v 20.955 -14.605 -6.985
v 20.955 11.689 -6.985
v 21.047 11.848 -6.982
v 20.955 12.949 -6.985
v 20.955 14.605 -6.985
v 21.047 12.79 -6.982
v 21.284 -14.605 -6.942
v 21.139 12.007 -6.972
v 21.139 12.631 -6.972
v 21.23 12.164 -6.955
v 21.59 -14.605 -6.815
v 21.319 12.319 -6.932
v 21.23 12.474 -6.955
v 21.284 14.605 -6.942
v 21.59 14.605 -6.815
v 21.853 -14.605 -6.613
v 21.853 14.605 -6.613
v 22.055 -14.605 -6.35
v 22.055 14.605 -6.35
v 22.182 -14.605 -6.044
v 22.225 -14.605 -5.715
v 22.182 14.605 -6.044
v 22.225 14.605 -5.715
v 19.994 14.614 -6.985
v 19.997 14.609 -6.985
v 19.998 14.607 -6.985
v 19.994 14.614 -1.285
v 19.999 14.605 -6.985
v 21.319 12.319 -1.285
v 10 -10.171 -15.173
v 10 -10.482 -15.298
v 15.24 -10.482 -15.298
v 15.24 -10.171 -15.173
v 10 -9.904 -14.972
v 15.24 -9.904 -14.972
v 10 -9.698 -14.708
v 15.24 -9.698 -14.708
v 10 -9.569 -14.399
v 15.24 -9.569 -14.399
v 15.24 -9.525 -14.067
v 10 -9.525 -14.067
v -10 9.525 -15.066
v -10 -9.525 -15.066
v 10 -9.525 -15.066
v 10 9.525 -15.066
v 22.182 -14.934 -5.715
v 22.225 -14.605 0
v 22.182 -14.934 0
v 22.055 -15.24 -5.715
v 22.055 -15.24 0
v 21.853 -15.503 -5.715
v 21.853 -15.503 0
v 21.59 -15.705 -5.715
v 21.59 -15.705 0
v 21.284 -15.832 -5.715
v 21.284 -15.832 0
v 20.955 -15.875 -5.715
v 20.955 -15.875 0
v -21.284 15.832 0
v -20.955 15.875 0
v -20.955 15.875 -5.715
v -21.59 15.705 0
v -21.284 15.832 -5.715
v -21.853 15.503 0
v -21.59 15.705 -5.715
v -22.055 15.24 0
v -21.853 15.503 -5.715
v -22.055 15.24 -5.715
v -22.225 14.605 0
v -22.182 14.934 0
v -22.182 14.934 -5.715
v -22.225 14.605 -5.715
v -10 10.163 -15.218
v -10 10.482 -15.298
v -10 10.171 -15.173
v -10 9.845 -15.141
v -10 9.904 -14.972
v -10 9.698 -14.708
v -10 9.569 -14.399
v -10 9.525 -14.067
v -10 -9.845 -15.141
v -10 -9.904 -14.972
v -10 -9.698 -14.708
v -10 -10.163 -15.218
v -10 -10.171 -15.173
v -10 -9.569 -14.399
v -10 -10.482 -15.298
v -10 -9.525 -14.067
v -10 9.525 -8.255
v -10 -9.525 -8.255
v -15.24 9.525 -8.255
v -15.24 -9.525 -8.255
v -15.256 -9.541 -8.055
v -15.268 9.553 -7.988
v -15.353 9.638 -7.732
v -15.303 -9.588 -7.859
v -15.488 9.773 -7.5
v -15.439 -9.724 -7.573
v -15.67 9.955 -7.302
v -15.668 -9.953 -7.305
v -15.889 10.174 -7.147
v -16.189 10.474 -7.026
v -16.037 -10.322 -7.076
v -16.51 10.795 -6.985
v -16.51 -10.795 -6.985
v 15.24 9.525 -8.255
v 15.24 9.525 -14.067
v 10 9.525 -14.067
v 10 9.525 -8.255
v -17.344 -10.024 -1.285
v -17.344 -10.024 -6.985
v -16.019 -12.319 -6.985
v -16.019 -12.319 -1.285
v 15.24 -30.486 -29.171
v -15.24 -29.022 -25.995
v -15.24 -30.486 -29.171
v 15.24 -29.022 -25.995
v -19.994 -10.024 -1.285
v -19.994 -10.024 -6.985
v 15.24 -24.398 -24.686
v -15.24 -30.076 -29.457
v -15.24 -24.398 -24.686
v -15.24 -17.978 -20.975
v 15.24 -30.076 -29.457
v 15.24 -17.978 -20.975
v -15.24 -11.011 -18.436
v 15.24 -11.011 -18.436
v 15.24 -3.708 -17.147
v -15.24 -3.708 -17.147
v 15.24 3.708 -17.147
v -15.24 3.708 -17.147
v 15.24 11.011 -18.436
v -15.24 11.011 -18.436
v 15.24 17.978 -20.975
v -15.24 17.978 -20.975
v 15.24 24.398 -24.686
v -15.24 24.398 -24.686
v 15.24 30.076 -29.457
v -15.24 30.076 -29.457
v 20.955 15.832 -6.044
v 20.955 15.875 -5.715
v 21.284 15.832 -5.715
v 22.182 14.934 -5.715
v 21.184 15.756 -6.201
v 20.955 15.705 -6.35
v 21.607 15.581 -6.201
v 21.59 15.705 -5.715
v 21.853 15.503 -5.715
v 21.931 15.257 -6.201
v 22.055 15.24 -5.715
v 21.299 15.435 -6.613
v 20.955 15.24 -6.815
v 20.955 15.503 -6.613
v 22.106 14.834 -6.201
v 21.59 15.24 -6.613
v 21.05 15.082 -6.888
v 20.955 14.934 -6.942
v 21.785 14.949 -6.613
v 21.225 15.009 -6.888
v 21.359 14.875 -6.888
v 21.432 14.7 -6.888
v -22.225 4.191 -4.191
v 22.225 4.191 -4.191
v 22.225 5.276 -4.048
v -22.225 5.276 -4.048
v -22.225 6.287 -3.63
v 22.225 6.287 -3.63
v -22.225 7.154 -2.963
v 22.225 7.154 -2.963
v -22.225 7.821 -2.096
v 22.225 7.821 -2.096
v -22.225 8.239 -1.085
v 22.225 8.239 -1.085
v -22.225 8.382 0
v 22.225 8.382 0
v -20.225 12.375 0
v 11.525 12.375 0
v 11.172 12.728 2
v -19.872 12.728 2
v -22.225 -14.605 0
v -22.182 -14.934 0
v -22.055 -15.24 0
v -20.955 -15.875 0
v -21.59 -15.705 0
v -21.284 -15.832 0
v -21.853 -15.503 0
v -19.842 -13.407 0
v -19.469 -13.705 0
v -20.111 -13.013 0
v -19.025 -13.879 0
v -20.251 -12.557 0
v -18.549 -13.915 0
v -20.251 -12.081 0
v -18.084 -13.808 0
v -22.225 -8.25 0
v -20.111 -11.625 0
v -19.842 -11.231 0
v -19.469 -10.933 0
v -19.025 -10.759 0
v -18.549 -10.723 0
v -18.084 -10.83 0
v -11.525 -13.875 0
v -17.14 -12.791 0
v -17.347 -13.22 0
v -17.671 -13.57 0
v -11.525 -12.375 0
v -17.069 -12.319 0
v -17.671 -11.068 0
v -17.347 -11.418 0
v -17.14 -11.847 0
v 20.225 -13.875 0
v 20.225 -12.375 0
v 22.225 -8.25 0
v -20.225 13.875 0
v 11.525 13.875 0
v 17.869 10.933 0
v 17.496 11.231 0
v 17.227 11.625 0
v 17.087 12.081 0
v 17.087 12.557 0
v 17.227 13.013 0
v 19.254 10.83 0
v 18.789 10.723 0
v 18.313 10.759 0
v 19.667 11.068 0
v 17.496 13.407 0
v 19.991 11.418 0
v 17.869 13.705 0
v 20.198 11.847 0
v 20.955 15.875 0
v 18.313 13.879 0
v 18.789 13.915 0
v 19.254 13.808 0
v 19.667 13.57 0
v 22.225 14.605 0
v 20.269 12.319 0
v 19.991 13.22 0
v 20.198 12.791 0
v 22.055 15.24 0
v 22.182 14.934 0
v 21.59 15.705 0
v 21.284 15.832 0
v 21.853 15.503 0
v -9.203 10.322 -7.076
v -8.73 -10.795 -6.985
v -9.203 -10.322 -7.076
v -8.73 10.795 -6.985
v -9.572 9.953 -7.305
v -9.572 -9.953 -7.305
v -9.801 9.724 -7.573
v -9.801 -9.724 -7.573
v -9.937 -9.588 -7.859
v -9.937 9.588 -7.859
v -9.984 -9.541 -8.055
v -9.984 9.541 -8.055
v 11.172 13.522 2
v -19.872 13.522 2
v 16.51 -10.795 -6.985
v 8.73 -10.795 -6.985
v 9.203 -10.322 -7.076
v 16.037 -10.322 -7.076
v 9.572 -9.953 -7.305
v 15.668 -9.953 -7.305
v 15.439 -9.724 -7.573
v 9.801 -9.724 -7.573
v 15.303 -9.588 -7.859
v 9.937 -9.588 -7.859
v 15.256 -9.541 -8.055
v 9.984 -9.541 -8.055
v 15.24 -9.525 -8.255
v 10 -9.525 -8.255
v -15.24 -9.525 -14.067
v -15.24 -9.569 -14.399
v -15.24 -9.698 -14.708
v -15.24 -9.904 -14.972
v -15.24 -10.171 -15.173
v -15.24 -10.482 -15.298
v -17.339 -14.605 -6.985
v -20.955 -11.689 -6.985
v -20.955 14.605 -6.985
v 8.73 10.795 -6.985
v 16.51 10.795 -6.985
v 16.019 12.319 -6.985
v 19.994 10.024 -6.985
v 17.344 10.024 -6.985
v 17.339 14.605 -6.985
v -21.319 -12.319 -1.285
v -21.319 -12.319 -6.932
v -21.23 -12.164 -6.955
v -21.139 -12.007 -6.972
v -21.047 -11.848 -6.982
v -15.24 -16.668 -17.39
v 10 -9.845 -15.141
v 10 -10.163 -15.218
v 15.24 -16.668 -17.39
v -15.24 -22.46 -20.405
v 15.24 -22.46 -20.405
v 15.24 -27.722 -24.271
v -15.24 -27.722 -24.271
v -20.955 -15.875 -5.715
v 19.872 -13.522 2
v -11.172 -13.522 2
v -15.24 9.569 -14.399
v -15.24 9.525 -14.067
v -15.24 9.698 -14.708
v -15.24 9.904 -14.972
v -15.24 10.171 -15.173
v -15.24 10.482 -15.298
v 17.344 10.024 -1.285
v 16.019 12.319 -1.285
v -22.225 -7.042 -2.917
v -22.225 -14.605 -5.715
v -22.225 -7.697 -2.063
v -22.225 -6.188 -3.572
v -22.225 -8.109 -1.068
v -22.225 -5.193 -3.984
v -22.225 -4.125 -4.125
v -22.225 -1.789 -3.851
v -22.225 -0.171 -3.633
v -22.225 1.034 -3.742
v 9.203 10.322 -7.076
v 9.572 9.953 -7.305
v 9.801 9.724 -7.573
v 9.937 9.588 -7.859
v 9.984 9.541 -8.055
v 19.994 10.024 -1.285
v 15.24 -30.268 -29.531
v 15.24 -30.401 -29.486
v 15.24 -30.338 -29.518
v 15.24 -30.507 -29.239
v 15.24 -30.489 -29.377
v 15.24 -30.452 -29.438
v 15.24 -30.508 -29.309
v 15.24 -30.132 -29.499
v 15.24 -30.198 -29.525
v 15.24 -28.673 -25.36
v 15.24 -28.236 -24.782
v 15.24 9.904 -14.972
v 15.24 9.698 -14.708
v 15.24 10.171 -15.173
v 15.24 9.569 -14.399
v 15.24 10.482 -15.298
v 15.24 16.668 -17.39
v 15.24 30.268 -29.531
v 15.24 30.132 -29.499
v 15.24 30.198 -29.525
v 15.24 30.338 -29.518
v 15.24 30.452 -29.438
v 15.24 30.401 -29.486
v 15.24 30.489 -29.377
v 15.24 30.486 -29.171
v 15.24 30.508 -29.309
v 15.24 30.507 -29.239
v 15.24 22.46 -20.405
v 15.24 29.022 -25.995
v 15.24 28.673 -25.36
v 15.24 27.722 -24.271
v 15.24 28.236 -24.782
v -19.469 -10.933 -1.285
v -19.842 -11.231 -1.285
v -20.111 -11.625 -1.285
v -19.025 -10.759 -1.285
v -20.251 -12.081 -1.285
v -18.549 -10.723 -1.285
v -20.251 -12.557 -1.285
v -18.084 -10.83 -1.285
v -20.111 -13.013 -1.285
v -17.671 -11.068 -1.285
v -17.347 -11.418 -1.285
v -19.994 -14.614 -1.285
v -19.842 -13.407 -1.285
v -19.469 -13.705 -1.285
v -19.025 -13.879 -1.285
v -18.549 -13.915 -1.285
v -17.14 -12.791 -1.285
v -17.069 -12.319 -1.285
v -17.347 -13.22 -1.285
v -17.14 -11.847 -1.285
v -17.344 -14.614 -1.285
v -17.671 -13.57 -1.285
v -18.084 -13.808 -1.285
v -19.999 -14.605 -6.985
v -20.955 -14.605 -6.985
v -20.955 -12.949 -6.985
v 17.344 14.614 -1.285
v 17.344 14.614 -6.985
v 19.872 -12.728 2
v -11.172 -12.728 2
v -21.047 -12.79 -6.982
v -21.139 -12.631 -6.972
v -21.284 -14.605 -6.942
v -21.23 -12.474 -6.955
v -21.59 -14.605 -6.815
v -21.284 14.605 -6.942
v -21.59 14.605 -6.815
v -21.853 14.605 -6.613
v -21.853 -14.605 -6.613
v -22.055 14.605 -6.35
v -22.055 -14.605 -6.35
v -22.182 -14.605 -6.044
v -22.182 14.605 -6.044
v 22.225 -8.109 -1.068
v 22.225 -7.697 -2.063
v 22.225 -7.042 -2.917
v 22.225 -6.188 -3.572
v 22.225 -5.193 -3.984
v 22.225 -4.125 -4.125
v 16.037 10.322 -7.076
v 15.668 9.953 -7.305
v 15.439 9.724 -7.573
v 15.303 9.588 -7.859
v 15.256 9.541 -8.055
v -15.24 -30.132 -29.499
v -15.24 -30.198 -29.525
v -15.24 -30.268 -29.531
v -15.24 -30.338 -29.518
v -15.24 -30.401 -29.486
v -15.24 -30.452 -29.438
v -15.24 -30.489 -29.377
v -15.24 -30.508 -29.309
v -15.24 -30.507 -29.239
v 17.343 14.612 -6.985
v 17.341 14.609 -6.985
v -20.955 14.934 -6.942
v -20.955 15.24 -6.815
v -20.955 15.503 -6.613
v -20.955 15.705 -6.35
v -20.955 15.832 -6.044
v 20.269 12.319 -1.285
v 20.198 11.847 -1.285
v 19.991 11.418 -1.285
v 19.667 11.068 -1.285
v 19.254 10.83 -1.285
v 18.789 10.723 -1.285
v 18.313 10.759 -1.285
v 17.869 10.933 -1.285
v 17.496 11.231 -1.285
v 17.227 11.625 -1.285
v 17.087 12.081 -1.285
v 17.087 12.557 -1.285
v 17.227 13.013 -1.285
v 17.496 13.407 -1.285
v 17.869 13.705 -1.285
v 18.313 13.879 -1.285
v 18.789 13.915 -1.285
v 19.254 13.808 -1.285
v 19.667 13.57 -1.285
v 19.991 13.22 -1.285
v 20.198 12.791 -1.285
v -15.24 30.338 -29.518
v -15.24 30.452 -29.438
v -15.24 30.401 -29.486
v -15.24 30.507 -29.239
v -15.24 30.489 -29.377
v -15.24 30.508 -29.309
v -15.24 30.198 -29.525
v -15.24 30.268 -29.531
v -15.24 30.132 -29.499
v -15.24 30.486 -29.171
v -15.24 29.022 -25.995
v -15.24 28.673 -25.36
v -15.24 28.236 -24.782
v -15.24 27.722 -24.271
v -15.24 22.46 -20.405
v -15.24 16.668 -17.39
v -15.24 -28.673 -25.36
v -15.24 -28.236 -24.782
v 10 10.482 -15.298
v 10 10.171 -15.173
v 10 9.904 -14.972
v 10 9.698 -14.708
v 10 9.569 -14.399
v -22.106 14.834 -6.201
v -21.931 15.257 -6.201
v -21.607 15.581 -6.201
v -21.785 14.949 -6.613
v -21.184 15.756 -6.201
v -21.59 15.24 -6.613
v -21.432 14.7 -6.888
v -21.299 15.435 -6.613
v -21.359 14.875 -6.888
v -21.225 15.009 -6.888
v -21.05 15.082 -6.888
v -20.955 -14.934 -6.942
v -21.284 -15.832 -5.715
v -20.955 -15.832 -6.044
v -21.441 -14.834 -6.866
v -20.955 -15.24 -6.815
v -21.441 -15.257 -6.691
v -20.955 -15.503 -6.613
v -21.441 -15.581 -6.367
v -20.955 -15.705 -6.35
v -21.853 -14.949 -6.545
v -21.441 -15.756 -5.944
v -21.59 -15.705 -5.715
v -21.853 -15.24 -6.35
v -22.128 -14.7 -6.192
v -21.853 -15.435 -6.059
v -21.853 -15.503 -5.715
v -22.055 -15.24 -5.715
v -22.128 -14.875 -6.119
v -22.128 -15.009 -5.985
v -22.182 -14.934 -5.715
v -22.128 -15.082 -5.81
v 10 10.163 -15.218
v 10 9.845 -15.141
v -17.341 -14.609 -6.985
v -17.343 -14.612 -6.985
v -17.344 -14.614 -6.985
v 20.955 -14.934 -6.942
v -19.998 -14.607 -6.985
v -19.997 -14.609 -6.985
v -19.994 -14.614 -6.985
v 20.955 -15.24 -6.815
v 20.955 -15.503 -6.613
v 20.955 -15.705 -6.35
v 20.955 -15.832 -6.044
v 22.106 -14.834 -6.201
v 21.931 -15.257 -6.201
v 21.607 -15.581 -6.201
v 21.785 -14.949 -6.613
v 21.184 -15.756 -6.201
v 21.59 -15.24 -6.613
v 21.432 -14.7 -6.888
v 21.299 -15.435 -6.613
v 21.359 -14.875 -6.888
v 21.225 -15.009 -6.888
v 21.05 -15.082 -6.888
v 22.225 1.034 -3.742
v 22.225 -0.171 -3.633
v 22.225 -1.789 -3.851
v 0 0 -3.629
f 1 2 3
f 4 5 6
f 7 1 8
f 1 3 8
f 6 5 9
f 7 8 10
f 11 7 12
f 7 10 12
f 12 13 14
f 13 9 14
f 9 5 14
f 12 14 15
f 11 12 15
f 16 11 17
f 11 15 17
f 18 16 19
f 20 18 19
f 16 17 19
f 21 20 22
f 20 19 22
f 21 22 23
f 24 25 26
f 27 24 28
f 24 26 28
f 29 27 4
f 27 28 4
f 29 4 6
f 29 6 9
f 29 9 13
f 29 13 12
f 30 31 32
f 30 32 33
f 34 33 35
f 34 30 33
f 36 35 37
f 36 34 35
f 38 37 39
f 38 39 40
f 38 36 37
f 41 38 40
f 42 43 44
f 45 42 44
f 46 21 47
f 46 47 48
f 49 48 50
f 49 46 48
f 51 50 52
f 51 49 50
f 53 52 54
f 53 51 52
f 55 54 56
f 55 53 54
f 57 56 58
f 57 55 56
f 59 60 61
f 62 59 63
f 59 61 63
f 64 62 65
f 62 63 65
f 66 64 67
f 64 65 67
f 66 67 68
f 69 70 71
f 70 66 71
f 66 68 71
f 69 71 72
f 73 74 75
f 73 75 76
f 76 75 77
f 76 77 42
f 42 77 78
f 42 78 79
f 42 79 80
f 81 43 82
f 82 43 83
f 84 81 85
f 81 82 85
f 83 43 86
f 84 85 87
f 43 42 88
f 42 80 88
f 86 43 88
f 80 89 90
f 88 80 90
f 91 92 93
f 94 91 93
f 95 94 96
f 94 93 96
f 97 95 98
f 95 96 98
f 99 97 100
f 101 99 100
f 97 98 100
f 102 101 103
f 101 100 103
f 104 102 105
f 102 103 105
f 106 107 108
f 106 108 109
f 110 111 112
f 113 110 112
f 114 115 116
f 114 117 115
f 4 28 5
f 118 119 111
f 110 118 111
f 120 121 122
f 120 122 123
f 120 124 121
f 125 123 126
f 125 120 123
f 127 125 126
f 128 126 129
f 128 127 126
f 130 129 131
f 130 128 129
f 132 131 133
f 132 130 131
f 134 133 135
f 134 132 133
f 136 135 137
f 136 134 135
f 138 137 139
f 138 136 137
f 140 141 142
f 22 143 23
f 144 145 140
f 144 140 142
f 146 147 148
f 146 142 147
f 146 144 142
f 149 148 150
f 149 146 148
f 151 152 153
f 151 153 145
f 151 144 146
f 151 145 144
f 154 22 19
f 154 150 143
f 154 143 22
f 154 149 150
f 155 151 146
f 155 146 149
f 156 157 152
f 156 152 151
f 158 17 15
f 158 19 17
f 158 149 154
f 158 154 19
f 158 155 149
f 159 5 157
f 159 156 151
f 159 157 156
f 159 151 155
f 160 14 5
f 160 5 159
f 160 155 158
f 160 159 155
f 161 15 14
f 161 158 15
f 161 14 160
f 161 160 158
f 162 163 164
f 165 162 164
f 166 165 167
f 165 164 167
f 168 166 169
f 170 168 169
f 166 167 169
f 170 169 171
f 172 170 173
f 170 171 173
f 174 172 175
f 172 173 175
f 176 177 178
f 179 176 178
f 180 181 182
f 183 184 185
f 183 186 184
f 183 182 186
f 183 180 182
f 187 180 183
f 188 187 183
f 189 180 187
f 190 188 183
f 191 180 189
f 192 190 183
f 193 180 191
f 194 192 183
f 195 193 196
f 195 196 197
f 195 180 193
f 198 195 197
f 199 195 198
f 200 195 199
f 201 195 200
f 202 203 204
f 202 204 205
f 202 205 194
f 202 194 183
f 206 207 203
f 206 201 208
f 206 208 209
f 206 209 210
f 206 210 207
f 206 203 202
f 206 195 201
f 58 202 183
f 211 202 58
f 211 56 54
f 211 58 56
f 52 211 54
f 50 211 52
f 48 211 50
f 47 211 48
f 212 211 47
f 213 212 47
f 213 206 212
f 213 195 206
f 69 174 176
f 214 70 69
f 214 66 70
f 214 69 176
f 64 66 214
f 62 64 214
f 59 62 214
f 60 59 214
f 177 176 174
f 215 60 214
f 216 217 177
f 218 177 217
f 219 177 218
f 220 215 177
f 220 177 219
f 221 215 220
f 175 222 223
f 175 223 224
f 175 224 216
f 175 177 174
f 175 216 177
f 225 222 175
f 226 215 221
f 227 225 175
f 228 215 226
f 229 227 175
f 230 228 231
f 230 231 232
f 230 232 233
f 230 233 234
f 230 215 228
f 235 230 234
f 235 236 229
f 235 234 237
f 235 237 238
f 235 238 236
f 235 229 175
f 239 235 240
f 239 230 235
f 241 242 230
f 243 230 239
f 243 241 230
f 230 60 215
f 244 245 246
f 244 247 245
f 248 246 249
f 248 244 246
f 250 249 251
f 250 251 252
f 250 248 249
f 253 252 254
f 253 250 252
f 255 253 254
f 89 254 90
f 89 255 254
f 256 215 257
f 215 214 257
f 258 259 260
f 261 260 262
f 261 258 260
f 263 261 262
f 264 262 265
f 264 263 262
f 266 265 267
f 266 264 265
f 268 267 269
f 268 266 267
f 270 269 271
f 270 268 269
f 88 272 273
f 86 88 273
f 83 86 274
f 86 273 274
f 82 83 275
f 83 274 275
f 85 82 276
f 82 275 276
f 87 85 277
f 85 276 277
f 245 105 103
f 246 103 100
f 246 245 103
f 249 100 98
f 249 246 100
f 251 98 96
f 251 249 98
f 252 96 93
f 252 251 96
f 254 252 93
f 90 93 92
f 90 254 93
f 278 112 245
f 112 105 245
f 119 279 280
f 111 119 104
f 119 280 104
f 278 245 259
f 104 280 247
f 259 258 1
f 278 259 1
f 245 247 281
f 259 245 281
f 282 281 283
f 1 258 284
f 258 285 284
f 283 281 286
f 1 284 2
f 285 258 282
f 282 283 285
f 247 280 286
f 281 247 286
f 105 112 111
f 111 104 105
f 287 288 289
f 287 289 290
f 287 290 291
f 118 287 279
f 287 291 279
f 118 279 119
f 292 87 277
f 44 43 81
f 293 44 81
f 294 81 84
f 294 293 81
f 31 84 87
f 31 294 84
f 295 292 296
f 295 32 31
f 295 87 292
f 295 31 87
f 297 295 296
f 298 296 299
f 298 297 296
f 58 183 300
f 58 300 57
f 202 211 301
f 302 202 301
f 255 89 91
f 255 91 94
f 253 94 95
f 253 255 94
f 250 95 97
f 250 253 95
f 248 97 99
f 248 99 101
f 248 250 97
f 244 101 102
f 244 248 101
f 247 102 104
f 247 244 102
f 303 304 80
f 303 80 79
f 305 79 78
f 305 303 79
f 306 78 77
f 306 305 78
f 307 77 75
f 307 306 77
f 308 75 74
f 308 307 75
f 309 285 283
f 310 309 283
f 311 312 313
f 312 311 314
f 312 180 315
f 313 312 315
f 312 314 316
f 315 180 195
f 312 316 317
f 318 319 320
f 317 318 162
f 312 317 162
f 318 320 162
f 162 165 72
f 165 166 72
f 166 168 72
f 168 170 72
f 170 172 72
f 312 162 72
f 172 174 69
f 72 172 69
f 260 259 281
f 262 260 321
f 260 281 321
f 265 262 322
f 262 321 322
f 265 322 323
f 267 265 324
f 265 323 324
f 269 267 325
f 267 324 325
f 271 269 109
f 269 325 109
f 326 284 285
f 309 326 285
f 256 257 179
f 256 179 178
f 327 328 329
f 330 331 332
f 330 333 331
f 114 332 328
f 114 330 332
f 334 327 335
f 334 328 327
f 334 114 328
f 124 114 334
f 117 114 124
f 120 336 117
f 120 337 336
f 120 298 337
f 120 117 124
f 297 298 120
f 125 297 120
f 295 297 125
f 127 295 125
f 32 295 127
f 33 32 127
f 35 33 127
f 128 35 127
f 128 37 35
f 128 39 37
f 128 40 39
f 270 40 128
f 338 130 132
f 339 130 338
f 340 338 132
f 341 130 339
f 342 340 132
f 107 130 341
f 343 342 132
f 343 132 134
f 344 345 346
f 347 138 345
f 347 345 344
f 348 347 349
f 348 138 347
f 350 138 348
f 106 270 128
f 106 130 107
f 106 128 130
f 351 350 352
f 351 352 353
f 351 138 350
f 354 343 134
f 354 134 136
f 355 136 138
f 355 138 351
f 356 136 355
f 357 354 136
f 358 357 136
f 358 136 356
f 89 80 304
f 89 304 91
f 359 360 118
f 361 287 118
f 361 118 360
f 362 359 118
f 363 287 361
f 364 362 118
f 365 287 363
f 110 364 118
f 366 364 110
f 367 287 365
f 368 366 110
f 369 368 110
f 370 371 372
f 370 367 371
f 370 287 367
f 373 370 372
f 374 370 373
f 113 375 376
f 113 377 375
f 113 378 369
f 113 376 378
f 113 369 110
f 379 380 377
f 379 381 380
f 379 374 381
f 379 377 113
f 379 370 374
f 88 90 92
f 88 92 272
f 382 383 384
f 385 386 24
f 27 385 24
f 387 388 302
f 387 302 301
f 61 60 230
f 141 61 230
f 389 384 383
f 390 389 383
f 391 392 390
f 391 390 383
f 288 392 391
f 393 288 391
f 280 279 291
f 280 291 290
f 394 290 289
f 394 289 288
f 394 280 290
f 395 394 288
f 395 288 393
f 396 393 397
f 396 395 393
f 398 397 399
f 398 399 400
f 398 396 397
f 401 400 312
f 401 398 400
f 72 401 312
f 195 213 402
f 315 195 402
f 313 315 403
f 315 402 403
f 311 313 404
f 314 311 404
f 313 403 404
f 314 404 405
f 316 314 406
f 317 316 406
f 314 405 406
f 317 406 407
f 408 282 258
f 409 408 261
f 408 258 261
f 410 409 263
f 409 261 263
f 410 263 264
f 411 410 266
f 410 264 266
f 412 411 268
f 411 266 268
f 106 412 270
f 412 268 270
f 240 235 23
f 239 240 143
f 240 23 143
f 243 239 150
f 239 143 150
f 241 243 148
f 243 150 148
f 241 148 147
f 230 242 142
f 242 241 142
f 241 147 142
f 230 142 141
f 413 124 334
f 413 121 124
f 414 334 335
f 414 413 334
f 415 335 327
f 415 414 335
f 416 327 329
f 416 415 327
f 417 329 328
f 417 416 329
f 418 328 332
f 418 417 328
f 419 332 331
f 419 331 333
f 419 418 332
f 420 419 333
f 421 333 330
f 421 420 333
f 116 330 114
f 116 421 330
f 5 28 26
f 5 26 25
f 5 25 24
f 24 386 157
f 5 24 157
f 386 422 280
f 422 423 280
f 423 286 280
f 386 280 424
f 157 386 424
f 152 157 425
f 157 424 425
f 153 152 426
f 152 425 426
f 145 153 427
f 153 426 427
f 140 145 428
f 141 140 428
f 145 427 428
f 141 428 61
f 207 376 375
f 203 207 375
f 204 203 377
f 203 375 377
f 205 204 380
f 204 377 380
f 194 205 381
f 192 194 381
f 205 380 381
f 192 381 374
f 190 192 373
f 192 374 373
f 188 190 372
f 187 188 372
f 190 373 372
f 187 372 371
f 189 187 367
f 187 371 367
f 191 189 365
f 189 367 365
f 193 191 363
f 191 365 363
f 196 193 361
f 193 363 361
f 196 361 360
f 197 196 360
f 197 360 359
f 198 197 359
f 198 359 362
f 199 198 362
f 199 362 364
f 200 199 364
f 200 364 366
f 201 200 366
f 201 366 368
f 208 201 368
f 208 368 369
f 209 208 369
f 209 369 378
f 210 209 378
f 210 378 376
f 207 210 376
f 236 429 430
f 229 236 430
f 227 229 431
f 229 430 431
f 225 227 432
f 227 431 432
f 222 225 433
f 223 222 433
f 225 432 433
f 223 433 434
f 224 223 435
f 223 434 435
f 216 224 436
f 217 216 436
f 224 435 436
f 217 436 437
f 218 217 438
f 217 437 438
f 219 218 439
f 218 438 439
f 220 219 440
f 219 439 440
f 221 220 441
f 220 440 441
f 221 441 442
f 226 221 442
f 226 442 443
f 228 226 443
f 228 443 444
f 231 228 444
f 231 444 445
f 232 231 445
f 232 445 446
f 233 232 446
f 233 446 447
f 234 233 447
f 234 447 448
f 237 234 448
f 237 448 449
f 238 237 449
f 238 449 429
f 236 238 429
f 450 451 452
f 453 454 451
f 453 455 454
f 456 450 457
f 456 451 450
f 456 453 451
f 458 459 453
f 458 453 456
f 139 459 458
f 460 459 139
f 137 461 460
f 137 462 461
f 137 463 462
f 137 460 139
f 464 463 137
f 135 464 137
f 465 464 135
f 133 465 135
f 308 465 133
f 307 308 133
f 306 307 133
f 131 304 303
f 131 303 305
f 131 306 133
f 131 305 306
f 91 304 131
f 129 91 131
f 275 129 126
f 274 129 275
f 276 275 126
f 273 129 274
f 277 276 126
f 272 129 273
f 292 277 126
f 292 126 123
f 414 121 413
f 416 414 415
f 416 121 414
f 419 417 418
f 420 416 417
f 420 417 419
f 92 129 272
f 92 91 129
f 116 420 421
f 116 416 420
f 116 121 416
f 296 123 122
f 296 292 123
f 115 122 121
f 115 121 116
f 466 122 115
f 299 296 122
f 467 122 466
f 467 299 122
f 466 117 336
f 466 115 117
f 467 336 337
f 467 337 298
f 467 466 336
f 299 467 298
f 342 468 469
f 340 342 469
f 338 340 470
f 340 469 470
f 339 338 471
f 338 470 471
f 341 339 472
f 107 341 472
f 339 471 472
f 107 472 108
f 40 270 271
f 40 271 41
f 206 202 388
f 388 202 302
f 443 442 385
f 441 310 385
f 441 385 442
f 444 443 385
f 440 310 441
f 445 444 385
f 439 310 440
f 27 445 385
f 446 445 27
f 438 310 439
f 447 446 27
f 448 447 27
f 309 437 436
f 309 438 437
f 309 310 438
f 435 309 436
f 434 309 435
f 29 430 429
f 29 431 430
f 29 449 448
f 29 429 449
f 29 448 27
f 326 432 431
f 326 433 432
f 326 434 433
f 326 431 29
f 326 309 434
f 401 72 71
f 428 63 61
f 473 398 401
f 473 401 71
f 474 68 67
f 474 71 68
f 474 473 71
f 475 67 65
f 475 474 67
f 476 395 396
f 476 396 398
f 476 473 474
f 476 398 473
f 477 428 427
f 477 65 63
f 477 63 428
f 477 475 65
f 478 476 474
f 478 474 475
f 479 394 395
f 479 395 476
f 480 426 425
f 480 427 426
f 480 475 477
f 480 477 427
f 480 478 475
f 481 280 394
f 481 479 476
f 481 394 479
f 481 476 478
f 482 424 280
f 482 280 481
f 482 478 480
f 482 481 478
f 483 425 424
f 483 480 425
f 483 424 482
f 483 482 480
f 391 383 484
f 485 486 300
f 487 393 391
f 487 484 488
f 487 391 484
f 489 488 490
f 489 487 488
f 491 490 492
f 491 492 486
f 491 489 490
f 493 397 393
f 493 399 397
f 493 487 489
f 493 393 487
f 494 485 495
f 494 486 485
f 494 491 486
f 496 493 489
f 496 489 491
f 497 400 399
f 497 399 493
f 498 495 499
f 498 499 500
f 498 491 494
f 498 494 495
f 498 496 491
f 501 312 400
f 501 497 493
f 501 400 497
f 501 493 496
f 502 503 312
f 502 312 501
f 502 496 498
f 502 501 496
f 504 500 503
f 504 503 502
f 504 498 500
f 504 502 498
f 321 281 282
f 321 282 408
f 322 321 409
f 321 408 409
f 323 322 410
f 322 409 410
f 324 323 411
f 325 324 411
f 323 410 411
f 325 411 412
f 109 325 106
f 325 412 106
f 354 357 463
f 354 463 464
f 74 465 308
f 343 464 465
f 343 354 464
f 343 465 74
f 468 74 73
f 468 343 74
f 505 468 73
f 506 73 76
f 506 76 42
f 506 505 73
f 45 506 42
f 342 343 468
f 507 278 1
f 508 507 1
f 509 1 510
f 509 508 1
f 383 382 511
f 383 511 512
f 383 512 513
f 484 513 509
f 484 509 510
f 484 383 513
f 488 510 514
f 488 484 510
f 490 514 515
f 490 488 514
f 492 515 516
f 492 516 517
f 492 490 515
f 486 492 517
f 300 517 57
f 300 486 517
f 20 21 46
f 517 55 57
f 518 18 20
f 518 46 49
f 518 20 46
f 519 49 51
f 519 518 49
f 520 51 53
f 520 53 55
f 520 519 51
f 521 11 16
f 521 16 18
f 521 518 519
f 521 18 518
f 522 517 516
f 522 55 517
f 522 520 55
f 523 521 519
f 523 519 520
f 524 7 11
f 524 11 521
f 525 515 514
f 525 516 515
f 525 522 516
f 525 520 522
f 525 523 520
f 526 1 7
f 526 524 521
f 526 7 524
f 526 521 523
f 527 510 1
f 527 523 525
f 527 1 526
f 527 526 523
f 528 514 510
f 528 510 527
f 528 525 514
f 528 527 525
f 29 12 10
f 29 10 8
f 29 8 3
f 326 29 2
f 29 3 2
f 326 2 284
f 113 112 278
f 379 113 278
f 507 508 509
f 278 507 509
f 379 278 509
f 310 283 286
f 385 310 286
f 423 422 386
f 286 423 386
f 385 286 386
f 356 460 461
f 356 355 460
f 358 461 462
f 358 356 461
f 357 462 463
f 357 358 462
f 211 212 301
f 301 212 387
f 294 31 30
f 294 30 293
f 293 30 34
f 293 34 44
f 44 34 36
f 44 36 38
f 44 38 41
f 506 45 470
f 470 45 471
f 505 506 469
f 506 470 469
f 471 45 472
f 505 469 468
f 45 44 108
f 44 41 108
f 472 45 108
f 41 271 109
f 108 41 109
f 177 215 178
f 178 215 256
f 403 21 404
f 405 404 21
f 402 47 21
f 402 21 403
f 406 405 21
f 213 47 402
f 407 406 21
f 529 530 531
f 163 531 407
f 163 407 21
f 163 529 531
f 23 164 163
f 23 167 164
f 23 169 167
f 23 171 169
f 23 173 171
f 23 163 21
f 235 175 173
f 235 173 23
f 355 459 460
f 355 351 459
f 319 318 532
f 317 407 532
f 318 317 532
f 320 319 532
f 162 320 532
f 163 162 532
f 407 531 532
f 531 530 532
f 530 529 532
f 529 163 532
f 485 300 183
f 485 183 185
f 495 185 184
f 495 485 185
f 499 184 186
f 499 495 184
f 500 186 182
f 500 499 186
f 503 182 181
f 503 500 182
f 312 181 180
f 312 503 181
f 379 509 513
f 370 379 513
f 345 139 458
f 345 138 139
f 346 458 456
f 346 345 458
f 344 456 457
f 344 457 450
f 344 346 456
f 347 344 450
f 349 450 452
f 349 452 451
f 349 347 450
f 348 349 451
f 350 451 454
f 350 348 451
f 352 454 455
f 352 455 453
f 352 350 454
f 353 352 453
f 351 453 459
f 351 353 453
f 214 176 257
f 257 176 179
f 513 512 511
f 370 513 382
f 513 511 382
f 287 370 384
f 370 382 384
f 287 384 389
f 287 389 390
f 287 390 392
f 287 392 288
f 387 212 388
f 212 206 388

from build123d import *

# Parameters (mm, degrees)
F1_W          = 44.45
F1_H          = 31.75
F2_DEPTH      = 6.985
F4_DEPTH      = 44.45
F6_DEPTH      = 15.24
F6_DEPTH_BACK = 15.24
F7_W          = 20
F7_H          = 8.0811108913
F8_DEPTH      = 25.4
F9_R          = 1.6
F10_DEPTH     = 25.4
F11_R         = 1.6
F12_DEPTH     = 5.7
F13_W         = 31.75
F13_H         = 1.5
F14_DEPTH     = 2
F14_TAPER     = 10
F15_F1_R      = 0.254
F15_F2_R      = 0.254
F16_R         = 5.08
F18_R         = 1.27
F19_T1_DEPTH  = 5.24
F19_T3_DEPTH  = 5.24
F19_T5_DEPTH  = 8.89
F19_T7_DEPTH  = 29.21
F19_T9_DEPTH  = 41.91
F19_S13_W     = 1.2954
F19_S13_H     = 1.2954
F19_T14_DEPTH = 1.2954
F19_S19_W     = 1.2954
F19_S19_H     = 1.2954
F19_T20_DEPTH = 1.2954
F19_S25_W     = 1.2954
F19_S25_H     = 1.2954
F19_T26_DEPTH = 1.2954
F19_S31_W     = 1.2954
F19_S31_H     = 1.2954
F19_T32_DEPTH = 1.2954


# Not quite as in the source:
# - a fillet or chamfer that OpenCascade refuses, or shapes differently, is made with other operations: its cross-section is extruded or revolved along the edge and cut away or added
# - a feature of the source that left no trace in its solid (it failed there, or was rolled back) is left out


with BuildPart() as f2:
    # F1 (on Top) → F2 (new body)
    with BuildSketch(Plane.XY):
        Rectangle(F1_W, F1_H)
    extrude(amount=-F2_DEPTH)

    # F3 (on face) → F4 (cut, through all)
    with BuildSketch(Plane.YZ.offset(22.225)):
        with BuildLine():
            add(Edge.make_bspline(
                [(-4.125, 4.125), (-2.4255892558, 4.1137489608), (-0.0276085061, 2.971292738), (2.5249406681, 4.1137612248), (4.191, 4.191)],
                knots=[0, 0, 0, 0, 0.4977710734, 1, 1, 1, 1], degree=3))
            ThreePointArc((-4.125, 4.125), (-7.0418154724, 2.9168154724), (-8.25, 0))
            ThreePointArc((-8.25, 0), (-7.0418154724, -2.9168154724), (-4.125, -4.125))
            add(Edge.make_bspline(
                [(-4.125, -4.125), (-2.9335741419, -4.2006121948), (0.4172014685, -3.0581585459), (2.1438994445, -4.2006121948), (4.191, -4.191)],
                knots=[0, 0, 0, 0, 0.497799261, 1, 1, 1, 1], degree=3))
            ThreePointArc((4.191, -4.191), (7.15448452, -2.96348452), (8.382, 0))
            ThreePointArc((8.382, 0), (7.15448452, 2.96348452), (4.191, 4.191))
        make_face()
    extrude(amount=-F4_DEPTH, mode=Mode.SUBTRACT)

    # F5 (on Right) → F6 (join, two sides)
    with BuildSketch(Plane.YZ) as f6_sk:
        with BuildLine():
            ThreePointArc((-31.115, -30.5349261659), (0, -16.985), (31.115, -30.5349261659))
            Line((31.115, -30.5349261659), (28.575, -25.0251942949))
            ThreePointArc((28.575, -25.0251942949), (19.6900567688, -18.8213349574), (9.525, -15.0661108913))
            ThreePointArc((9.525, -15.0661108913), (0, -13.985), (-9.525, -15.0661108913))
            ThreePointArc((-9.525, -15.0661108913), (-19.6900567688, -18.8213349574), (-28.575, -25.0251942949))
            Line((-28.575, -25.0251942949), (-31.115, -30.5349261659))
        make_face()
        with BuildLine():
            ThreePointArc((-9.525, -15.0661108913), (0, -13.985), (9.525, -15.0661108913))
            Line((9.525, -15.0661108913), (9.525, -6.985))
            Line((9.525, -6.985), (-9.525, -6.985))
            Line((-9.525, -6.985), (-9.525, -15.0661108913))
        make_face()
    extrude(amount=F6_DEPTH)
    extrude(f6_sk.sketch, amount=-F6_DEPTH_BACK)

    # F7 (on face) → F8 (cut)
    with BuildSketch(Plane.XZ.offset(9.525)):
        with Locations((0, -11.0255554456)):
            Rectangle(F7_W, F7_H)
    extrude(amount=-F8_DEPTH, mode=Mode.SUBTRACT)

    # F9 (on face) → F10 (cut)
    with BuildSketch(Plane(origin=(0, 0, -6.985), x_dir=(1, 0, 0), z_dir=(0, 0, -1))):
        with Locations((-18.669, 12.319)):
            Circle(F9_R)
        with Locations((18.669, -12.319)):
            Circle(F9_R)
    extrude(amount=-F10_DEPTH, mode=Mode.SUBTRACT)

    # F11 (on face) → F12 (cut)
    with BuildSketch(Plane(origin=(0, 0, -6.985), x_dir=(1, 0, 0), z_dir=(0, 0, -1))):
        Polygon((-17.344, 10.02403268), (-16.019, 12.319), (-17.344, 14.61396732), (-19.994, 14.61396732), (-21.319, 12.319), (-19.994, 10.02403268), align=None)
        with Locations((-18.669, 12.319)):
            Circle(F11_R, mode=Mode.SUBTRACT)
        Polygon((19.994, -14.61396732), (21.319, -12.319), (19.994, -10.02403268), (17.344, -10.02403268), (16.019, -12.319), (17.344, -14.61396732), align=None)
        with Locations((18.669, -12.319)):
            Circle(F11_R, mode=Mode.SUBTRACT)
    extrude(amount=-F12_DEPTH, mode=Mode.SUBTRACT)

    # F13 (on face) → F14 (join)
    with BuildSketch(Plane.XY):
        with Locations((-4.35, 13.125)):
            Rectangle(F13_W, F13_H)
        with Locations((4.35, -13.125)):
            Rectangle(F13_W, F13_H)
    extrude(amount=F14_DEPTH, taper=F14_TAPER)

    # F15: fillet of radius 0.254 on 2 edges, made by hand

    # F15_f1
    f15_f1_edges = [f2.edges().sort_by_distance(p)[0] for p in [
        (0, -31.115, -30.5349261659),
    ]]
    fillet(f15_f1_edges, radius=F15_F1_R)

    # F15_f2
    f15_f2_edges = [f2.edges().sort_by_distance(p)[0] for p in [
        (0, 31.115, -30.5349261659),
    ]]
    fillet(f15_f2_edges, radius=F15_F2_R)

    # F16
    f16_edges = [f2.edges().sort_by_distance(p)[0] for p in [
        (0, 28.575, -25.025194),
        (0, -28.575, -25.025194),
    ]]
    fillet(f16_edges, radius=F16_R)

    # F18
    f18_edges = [f2.edges().sort_by_distance(p)[0] for p in [
        (12.62, 9.525, -6.985),
        (15.24, 0, -6.985),
        (12.62, -9.525, -6.985),
        (10, 0, -6.985),
        (-12.62, -9.525, -6.985),
        (-15.24, 0, -6.985),
        (-10, 0, -6.985),
        (-12.62, 9.525, -6.985),
    ]]
    fillet(f18_edges, radius=F18_R)

    # F19: fillet of radius 1.27 on 12 edges, made by hand

    # F19_s2 → F19_t1 (join)
    with BuildSketch(Plane.YZ.offset(-15.24)):
        with BuildLine():
            ThreePointArc((9.525, -14.0670689448), (9.7923311345, -14.8465271838), (10.4817797578, -15.2978382489))
            ThreePointArc((10.4817797578, -15.2978382489), (10.0040608486, -15.1792042016), (9.525, -15.0661108913))
            Line((9.525, -15.0661108913), (9.525, -14.0670689448))
        make_face()
        with BuildLine():
            ThreePointArc((-9.525, -14.0670689448), (-9.7923311345, -14.8465271838), (-10.4817797578, -15.2978382489))
            ThreePointArc((-10.4817797578, -15.2978382489), (-10.0040608486, -15.1792042016), (-9.525, -15.0661108913))
            Line((-9.525, -15.0661108913), (-9.525, -14.0670689448))
        make_face()
    extrude(amount=F19_T1_DEPTH)

    # F19_s4 → F19_t3 (join)
    with BuildSketch(Plane.YZ.offset(10)):
        with BuildLine():
            ThreePointArc((10.4817797578, -15.2978382489), (9.7923311345, -14.8465271838), (9.525, -14.0670689448))
            Line((9.525, -14.0670689448), (9.525, -15.0661108913))
            ThreePointArc((9.525, -15.0661108913), (10.0040608486, -15.1792042016), (10.4817797578, -15.2978382489))
        make_face()
        with BuildLine():
            ThreePointArc((-10.4817797578, -15.2978382489), (-9.7923311345, -14.8465271838), (-9.525, -14.0670689448))
            Line((-9.525, -14.0670689448), (-9.525, -15.0661108913))
            ThreePointArc((-9.525, -15.0661108913), (-10.0040608486, -15.1792042016), (-10.4817797578, -15.2978382489))
        make_face()
    extrude(amount=F19_T3_DEPTH)

    # F19_s6 → F19_t5 (cut)
    with BuildSketch(Plane.XY.offset(-5.715)):
        with BuildLine():
            ThreePointArc((-20.955, -15.875), (-21.8530256121, -15.5030256121), (-22.225, -14.605))
            Line((-22.225, -14.605), (-22.225, -15.875))
            Line((-22.225, -15.875), (-20.955, -15.875))
        make_face()
        with BuildLine():
            ThreePointArc((22.225, -14.605), (21.8530256121, -15.5030256121), (20.955, -15.875))
            Line((20.955, -15.875), (22.225, -15.875))
            Line((22.225, -15.875), (22.225, -14.605))
        make_face()
        with BuildLine():
            ThreePointArc((22.225, 14.605), (21.8530256121, 15.5030256121), (20.955, 15.875))
            Line((20.955, 15.875), (22.225, 15.875))
            Line((22.225, 15.875), (22.225, 14.605))
        make_face()
        with BuildLine():
            ThreePointArc((-20.955, 15.875), (-21.8530256121, 15.5030256121), (-22.225, 14.605))
            Line((-22.225, 14.605), (-22.225, 15.875))
            Line((-22.225, 15.875), (-20.955, 15.875))
        make_face()
    extrude(amount=F19_T5_DEPTH, mode=Mode.SUBTRACT)

    # F19_s8 → F19_t7 (cut)
    with BuildSketch(Plane.XZ.offset(-14.605)):
        with BuildLine():
            ThreePointArc((-20.955, -6.985), (-21.8530256121, -6.6130256121), (-22.225, -5.715))
            Line((-22.225, -5.715), (-22.225, -6.985))
            Line((-22.225, -6.985), (-20.955, -6.985))
        make_face()
        with BuildLine():
            ThreePointArc((20.955, -6.985), (21.8530256121, -6.6130256121), (22.225, -5.715))
            Line((22.225, -5.715), (22.225, -6.985))
            Line((22.225, -6.985), (20.955, -6.985))
        make_face()
    extrude(amount=F19_T7_DEPTH, mode=Mode.SUBTRACT)

    # F19_s10 → F19_t9 (cut)
    with BuildSketch(Plane.YZ.offset(-20.955)):
        with BuildLine():
            ThreePointArc((-14.605, -6.985), (-15.5030256121, -6.6130256121), (-15.875, -5.715))
            Line((-15.875, -5.715), (-15.875, -6.985))
            Line((-15.875, -6.985), (-14.605, -6.985))
        make_face()
        with BuildLine():
            ThreePointArc((14.605, -6.985), (15.5030256121, -6.6130256121), (15.875, -5.715))
            Line((15.875, -5.715), (15.875, -6.985))
            Line((15.875, -6.985), (14.605, -6.985))
        make_face()
    extrude(amount=F19_T9_DEPTH, mode=Mode.SUBTRACT)


with BuildPart() as f19_tool12:
    # F19_s13 → F19_t14 (new body)
    with BuildSketch(Plane.YZ.offset(-20.955)):
        with Locations((-15.2527, -6.3627)):
            Rectangle(F19_S13_W, F19_S13_H)
    extrude(amount=-F19_T14_DEPTH)

    # F19_s15 → F19_t16 (revolve, cut)
    with BuildSketch(Plane(origin=(-20.955, -14.605, -5.715), x_dir=(0, 0.7071067812, 0.7071067812), z_dir=(0, -0.7071067812, 0.7071067812))):
        with BuildLine():
            ThreePointArc((0, -1.27), (1.27, 0), (0, 1.27))
            Line((0, 1.27), (0, -1.27))
        make_face()
    revolve(axis=Axis((-20.955, -14.605, -5.715), (-1, 0, 0)), mode=Mode.SUBTRACT)


with BuildPart() as f2_1:
    add(f2.part)

    # F19_t11: cut F19_tool12
    add(f19_tool12.part, mode=Mode.SUBTRACT)


with BuildPart() as f19_tool18:
    # F19_s19 → F19_t20 (new body)
    with BuildSketch(Plane.XY.offset(-5.715)):
        with Locations((-21.6027, 15.2527)):
            Rectangle(F19_S19_W, F19_S19_H)
    extrude(amount=-F19_T20_DEPTH)

    # F19_s21 → F19_t22 (revolve, cut)
    with BuildSketch(Plane(origin=(-20.955, 14.605, -5.715), x_dir=(0.7071067812, -0.7071067812, 0), z_dir=(0.7071067812, 0.7071067812, 0))):
        with BuildLine():
            ThreePointArc((0, -1.27), (1.27, 0), (0, 1.27))
            Line((0, 1.27), (0, -1.27))
        make_face()
    revolve(axis=Axis((-20.955, 14.605, -5.715), (0, 0, -1)), mode=Mode.SUBTRACT)


with BuildPart() as f2_2:
    add(f2_1.part)

    # F19_t17: cut F19_tool18
    add(f19_tool18.part, mode=Mode.SUBTRACT)


with BuildPart() as f19_tool24:
    # F19_s25 → F19_t26 (new body)
    with BuildSketch(Plane.XY.offset(-5.715)):
        with Locations((21.6027, -15.2527)):
            Rectangle(F19_S25_W, F19_S25_H)
    extrude(amount=-F19_T26_DEPTH)

    # F19_s27 → F19_t28 (revolve, cut)
    with BuildSketch(Plane(origin=(20.955, -14.605, -5.715), x_dir=(-0.7071067812, 0.7071067812, 0), z_dir=(-0.7071067812, -0.7071067812, 0))):
        with BuildLine():
            ThreePointArc((0, -1.27), (1.27, 0), (0, 1.27))
            Line((0, 1.27), (0, -1.27))
        make_face()
    revolve(axis=Axis((20.955, -14.605, -5.715), (0, 0, -1)), mode=Mode.SUBTRACT)


with BuildPart() as f2_3:
    add(f2_2.part)

    # F19_t23: cut F19_tool24
    add(f19_tool24.part, mode=Mode.SUBTRACT)


with BuildPart() as f19_tool30:
    # F19_s31 → F19_t32 (new body)
    with BuildSketch(Plane.XY.offset(-5.715)):
        with Locations((21.6027, 15.2527)):
            Rectangle(F19_S31_W, F19_S31_H)
    extrude(amount=-F19_T32_DEPTH)

    # F19_s33 → F19_t34 (revolve, cut)
    with BuildSketch(Plane(origin=(20.955, 14.605, -5.715), x_dir=(-0.7071067812, -0.7071067812, 0), z_dir=(0.7071067812, -0.7071067812, 0))):
        with BuildLine():
            ThreePointArc((0, -1.27), (1.27, 0), (0, 1.27))
            Line((0, 1.27), (0, -1.27))
        make_face()
    revolve(axis=Axis((20.955, 14.605, -5.715), (0, 0, -1)), mode=Mode.SUBTRACT)


with BuildPart() as f2_4:
    add(f2_3.part)

    # F19_t29: cut F19_tool30
    add(f19_tool30.part, mode=Mode.SUBTRACT)


solid = f2_4.part
